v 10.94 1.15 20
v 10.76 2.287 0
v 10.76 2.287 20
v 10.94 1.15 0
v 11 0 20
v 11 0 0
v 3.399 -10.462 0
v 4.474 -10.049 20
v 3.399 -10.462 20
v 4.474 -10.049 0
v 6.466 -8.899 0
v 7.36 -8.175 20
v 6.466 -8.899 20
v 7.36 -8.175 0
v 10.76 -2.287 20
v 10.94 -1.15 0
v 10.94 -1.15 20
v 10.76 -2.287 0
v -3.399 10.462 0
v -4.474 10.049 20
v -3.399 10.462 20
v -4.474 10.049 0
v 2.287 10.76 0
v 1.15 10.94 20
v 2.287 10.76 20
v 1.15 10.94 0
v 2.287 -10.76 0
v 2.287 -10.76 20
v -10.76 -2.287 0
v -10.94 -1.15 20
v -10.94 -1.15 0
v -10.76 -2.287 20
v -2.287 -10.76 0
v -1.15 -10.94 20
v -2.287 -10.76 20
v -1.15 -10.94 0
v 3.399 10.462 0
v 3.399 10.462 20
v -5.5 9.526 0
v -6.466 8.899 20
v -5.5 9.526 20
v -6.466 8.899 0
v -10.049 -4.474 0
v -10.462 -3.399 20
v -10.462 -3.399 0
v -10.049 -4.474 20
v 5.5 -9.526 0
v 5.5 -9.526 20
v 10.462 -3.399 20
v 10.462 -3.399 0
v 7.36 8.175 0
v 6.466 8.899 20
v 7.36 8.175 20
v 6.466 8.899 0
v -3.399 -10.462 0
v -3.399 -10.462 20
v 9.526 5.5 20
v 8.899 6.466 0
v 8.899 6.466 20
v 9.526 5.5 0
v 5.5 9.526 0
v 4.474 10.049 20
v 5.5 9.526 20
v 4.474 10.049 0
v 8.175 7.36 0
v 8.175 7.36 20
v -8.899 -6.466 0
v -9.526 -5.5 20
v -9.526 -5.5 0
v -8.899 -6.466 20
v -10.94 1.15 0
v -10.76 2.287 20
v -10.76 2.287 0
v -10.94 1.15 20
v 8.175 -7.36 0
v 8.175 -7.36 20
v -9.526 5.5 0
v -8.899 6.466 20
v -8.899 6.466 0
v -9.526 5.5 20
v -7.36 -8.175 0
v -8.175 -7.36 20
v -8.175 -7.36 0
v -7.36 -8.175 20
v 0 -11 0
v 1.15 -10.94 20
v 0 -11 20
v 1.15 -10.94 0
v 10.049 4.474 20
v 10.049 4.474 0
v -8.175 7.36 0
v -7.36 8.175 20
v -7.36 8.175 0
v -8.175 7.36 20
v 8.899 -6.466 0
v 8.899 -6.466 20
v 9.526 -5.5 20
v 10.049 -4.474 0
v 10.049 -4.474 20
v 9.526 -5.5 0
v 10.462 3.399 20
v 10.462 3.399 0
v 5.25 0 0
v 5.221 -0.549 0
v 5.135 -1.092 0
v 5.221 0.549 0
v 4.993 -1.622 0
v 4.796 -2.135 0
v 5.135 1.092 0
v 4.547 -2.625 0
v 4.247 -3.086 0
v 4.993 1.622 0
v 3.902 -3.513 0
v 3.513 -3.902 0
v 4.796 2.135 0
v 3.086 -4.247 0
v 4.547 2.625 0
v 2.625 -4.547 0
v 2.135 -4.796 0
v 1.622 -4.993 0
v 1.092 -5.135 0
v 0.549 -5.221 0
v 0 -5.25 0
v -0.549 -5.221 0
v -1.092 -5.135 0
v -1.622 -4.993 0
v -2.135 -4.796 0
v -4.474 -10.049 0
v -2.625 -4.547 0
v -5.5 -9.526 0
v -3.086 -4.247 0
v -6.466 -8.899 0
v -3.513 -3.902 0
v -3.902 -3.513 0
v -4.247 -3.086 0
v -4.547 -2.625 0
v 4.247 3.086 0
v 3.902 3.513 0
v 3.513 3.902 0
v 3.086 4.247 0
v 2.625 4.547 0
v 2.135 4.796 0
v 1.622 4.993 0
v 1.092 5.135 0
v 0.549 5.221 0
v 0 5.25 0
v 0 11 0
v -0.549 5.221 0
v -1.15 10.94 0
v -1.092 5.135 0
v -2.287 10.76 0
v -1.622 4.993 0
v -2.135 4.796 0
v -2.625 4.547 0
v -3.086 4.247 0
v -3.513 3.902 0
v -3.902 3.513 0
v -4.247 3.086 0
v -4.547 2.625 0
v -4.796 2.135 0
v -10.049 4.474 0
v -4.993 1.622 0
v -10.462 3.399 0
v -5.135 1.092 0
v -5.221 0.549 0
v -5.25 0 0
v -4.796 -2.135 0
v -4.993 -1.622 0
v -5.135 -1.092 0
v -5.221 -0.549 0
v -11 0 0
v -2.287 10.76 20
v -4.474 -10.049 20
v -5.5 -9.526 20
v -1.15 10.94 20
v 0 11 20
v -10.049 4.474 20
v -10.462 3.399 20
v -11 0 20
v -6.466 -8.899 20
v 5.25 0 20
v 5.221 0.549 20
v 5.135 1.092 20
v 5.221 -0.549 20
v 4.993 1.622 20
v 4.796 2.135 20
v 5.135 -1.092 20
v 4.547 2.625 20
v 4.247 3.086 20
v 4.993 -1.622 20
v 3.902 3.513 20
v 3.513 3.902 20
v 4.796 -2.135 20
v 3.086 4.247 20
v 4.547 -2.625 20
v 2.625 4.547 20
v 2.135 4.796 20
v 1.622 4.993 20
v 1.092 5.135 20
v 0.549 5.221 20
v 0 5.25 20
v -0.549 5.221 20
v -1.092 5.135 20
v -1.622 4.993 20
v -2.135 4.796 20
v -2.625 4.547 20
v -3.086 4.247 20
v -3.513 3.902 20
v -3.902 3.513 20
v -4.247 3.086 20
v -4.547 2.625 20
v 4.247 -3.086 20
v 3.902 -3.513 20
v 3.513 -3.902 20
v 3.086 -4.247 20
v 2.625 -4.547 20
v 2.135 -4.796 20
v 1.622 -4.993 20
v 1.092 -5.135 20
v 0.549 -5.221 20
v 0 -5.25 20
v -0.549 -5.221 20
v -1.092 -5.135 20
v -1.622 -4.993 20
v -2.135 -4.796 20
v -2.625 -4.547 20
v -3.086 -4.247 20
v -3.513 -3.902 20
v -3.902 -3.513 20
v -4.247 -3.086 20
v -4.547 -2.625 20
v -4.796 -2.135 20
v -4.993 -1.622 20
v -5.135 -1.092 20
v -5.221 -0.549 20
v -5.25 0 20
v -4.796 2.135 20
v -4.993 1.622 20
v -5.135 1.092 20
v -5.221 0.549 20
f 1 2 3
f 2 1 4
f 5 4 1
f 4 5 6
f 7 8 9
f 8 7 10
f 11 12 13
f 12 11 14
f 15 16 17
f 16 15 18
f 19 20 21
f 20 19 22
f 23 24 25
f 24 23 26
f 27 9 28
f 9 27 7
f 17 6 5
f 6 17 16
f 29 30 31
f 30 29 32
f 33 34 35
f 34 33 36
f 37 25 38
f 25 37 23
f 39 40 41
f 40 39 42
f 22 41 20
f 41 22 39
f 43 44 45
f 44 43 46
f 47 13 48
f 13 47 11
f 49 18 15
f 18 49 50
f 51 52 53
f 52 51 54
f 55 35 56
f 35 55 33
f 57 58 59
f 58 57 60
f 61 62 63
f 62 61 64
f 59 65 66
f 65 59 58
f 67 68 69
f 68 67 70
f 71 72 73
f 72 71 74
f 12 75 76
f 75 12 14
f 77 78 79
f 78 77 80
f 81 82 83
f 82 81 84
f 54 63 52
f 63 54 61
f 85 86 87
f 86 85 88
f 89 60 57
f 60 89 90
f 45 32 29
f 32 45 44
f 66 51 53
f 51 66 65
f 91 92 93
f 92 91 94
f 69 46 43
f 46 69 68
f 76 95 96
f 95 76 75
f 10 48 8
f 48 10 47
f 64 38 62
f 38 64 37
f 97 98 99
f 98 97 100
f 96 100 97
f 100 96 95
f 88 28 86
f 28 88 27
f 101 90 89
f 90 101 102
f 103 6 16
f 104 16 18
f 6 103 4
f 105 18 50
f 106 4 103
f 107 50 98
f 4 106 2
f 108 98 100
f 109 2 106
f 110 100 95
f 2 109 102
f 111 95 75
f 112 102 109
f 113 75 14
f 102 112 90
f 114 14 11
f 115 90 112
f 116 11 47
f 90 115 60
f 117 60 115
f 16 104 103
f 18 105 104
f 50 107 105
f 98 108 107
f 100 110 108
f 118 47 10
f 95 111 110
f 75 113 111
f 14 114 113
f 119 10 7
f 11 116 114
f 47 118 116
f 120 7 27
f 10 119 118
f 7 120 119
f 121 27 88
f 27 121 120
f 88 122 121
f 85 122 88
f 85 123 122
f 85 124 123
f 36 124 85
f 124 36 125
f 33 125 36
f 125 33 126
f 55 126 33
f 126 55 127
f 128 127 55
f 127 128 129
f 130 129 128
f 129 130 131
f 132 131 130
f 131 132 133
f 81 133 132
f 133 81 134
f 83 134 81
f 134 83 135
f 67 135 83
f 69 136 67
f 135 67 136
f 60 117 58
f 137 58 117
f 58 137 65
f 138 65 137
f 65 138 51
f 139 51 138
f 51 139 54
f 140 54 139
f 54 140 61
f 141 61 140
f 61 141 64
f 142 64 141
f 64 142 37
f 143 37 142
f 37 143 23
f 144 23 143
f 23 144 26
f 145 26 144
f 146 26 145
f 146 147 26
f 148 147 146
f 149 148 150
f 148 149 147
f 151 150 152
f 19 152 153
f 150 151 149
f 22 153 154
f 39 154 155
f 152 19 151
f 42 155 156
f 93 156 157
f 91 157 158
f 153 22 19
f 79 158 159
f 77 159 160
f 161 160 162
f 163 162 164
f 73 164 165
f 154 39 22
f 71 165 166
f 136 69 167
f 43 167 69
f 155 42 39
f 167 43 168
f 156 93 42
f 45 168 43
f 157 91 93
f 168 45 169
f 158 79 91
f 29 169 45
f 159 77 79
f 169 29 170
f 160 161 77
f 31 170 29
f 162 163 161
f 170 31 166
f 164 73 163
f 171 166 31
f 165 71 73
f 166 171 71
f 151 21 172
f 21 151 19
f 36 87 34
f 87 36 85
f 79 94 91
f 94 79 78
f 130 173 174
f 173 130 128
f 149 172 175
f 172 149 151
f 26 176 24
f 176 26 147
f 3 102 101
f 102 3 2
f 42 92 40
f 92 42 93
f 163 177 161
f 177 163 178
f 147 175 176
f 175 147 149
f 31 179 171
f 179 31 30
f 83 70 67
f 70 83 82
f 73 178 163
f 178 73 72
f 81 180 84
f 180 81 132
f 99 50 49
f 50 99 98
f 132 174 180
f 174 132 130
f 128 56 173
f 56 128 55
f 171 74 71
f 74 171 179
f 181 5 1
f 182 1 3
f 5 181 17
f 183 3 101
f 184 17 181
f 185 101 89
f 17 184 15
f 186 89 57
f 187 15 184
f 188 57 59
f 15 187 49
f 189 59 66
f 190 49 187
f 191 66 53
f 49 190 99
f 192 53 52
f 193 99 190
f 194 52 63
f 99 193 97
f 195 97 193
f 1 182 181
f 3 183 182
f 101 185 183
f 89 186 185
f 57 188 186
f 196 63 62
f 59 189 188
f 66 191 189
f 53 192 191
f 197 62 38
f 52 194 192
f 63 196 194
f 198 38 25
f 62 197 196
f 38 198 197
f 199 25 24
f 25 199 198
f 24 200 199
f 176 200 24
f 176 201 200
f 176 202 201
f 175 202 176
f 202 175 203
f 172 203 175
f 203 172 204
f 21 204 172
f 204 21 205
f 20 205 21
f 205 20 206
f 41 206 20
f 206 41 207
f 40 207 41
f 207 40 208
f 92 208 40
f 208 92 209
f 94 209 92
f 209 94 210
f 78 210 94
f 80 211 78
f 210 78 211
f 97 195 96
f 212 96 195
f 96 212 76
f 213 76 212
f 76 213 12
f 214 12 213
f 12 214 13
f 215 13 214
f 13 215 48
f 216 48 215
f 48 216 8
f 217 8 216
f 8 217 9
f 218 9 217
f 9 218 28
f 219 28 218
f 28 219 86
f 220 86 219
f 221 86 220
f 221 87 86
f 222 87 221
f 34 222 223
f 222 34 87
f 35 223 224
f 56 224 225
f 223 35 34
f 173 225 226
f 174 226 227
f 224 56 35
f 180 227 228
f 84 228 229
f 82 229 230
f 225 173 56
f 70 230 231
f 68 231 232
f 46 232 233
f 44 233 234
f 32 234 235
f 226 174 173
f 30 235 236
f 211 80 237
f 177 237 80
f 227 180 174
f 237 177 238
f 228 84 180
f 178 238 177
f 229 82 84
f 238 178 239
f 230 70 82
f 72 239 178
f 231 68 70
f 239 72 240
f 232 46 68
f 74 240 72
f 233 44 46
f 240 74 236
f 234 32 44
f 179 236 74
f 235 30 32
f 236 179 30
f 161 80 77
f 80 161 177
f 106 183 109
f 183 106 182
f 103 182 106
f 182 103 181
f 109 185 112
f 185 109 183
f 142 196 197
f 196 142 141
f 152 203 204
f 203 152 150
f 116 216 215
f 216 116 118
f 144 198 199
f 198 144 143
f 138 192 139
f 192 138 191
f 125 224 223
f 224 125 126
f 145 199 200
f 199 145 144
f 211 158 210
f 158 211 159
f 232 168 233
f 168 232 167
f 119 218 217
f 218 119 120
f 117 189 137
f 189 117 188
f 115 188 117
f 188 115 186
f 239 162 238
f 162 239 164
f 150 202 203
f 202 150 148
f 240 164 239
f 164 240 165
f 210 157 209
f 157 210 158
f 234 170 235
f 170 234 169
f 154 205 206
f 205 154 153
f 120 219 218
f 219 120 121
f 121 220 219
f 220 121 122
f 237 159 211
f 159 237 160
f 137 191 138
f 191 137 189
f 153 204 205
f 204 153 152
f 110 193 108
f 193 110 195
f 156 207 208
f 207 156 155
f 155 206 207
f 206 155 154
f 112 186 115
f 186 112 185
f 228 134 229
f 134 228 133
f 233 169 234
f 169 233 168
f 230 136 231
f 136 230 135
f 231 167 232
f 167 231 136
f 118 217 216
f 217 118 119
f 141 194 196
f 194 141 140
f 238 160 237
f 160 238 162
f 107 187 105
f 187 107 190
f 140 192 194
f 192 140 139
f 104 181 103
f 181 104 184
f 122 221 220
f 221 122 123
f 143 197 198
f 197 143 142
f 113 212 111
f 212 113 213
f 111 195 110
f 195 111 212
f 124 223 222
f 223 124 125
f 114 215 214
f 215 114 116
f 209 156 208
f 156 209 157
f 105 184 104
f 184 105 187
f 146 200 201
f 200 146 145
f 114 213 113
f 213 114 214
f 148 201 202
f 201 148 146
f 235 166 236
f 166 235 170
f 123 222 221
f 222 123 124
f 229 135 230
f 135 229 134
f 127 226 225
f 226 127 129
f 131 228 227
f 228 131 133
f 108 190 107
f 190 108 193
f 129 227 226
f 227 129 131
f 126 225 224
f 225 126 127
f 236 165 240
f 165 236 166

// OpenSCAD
// Round spacer.
$fn = 60;
eps = 0.02;
inner_d = 10.5;
outer_d = 22;
length = 20;
difference() { cylinder(d=outer_d,h=length); translate([0,0,-eps]) cylinder(d=inner_d,h=length+2*eps); }
